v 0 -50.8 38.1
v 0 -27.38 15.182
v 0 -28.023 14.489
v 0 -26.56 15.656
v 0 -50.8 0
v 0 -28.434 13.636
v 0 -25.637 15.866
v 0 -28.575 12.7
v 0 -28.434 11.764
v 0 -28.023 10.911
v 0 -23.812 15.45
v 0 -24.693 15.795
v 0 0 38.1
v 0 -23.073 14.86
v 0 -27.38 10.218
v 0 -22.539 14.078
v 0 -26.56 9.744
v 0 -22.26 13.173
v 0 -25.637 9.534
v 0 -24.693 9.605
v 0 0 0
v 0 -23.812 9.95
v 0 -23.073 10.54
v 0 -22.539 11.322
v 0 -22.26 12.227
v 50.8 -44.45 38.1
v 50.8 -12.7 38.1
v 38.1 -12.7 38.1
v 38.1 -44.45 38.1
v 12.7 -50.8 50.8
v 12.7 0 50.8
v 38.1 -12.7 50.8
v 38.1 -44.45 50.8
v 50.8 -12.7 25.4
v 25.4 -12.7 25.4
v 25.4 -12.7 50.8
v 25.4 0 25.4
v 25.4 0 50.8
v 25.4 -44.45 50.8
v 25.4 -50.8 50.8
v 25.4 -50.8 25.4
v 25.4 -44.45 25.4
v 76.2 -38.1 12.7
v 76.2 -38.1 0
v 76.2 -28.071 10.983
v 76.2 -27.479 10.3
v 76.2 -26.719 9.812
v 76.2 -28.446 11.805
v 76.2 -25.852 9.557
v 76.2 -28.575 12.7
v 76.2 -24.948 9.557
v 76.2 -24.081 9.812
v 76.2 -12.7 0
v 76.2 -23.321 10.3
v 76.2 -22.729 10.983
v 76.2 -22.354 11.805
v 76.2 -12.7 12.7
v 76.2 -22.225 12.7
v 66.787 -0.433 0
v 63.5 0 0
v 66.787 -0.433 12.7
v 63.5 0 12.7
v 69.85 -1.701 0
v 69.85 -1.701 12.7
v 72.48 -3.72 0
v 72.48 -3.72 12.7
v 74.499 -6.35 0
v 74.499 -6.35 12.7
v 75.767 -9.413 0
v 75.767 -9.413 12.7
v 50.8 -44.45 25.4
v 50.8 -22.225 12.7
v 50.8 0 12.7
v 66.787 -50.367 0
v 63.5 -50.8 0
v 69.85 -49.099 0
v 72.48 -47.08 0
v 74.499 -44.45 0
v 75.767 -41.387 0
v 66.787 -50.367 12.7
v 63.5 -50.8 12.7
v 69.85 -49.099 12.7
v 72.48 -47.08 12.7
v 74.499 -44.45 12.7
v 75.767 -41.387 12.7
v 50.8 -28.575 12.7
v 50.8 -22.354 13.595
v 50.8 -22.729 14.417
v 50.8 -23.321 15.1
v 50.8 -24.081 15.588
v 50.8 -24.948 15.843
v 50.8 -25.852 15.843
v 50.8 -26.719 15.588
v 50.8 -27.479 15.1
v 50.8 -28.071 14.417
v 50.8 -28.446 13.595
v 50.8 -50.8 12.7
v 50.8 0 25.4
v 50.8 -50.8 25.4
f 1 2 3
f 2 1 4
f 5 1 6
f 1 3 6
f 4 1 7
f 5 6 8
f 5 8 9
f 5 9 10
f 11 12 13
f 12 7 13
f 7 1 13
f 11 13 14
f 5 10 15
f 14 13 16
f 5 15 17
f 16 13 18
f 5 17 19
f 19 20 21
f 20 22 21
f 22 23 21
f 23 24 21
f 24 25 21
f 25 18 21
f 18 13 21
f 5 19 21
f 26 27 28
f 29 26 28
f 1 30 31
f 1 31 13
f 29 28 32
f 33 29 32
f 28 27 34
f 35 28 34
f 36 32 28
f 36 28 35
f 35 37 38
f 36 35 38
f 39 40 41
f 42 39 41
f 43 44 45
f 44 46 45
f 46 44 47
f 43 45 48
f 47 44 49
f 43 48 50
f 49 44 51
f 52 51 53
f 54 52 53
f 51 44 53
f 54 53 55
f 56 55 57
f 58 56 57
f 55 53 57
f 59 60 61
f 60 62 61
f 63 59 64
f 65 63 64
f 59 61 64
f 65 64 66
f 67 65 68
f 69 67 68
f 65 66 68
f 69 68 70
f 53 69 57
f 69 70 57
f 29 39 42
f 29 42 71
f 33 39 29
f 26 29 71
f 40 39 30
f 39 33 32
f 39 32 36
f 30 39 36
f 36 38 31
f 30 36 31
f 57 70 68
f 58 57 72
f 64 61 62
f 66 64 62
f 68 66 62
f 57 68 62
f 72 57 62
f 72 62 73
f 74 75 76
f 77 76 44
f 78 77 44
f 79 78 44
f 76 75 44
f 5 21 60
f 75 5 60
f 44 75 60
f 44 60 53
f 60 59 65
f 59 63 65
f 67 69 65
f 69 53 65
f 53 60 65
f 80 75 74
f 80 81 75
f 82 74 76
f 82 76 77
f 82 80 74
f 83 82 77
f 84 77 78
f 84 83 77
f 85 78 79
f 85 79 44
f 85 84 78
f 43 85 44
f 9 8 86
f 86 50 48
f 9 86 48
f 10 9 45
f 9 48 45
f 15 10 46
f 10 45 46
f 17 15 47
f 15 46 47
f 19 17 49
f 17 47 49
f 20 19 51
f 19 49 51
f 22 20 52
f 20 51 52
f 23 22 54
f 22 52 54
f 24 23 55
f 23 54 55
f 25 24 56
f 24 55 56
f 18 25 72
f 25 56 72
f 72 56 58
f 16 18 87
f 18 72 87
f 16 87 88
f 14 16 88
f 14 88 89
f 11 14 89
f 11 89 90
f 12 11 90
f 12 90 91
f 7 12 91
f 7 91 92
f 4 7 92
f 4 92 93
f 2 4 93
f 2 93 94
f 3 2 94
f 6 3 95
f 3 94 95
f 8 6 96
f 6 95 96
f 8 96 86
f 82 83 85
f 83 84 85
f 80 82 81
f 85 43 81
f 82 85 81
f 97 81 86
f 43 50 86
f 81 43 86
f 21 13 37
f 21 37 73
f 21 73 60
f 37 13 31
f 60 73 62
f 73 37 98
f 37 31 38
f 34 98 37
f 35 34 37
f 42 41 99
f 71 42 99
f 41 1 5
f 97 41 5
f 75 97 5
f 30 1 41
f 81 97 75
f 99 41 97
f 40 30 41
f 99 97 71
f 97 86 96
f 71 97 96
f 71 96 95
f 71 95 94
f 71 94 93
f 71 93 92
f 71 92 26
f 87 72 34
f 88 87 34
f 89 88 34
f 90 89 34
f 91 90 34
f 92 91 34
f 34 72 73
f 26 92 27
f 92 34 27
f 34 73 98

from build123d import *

# Parameters (mm, degrees)
F1_DEPTH = 50.8
F3_DEPTH = 6.35
F5_DEPTH = 12.7
F7_DEPTH = 76.2
F8_R     = 12.7


with BuildPart() as f1:
    # F0 (on Front) → F1 (new body)
    with BuildSketch(Plane.XZ):
        Polygon((0, 38.1), (0, 0), (76.2, 0), (76.2, 12.7), (50.8, 12.7), (50.8, 38.1), (38.1, 38.1), (38.1, 50.8), (12.7, 50.8), align=None)
    extrude(amount=F1_DEPTH)

    # F2 (on face) → F3 (cut, symmetric)
    with BuildSketch(Plane.XZ.offset(50.8)):
        Polygon((38.1, 50.8), (25.4, 50.8), (25.4, 25.4), (50.8, 25.4), (50.8, 38.1), (38.1, 38.1), align=None)
    extrude(amount=F3_DEPTH, both=True, mode=Mode.SUBTRACT)

    # F4 (on face) → F5 (cut)
    with BuildSketch(Plane(origin=(0, 0, 0), x_dir=(-1, 0, 0), z_dir=(0, 1, 0))):
        Polygon((-25.4, 25.4), (-25.4, 50.8), (-38.1, 50.8), (-38.1, 38.1), (-50.8, 38.1), (-50.8, 25.4), align=None)
    extrude(amount=-F5_DEPTH, mode=Mode.SUBTRACT)

    # F6 (on face) → F7 (cut)
    with BuildSketch(Plane.YZ.offset(76.2)):
        with BuildLine():
            Line((-28.575, 12.7), (-22.225, 12.7))
            ThreePointArc((-22.225, 12.7), (-25.4, 15.875), (-28.575, 12.7))
        make_face()
        with BuildLine():
            ThreePointArc((-28.575, 12.7), (-25.4, 9.525), (-22.225, 12.7))
            Line((-22.225, 12.7), (-28.575, 12.7))
        make_face()
    extrude(amount=-F7_DEPTH, mode=Mode.SUBTRACT)

    # F8
    f8_edges = [f1.edges().sort_by_distance(p)[0] for p in [
        (76.2, -50.8, 6.35),
        (76.2, 0, 6.35),
    ]]
    fillet(f8_edges, radius=F8_R)


solid = f1.part
